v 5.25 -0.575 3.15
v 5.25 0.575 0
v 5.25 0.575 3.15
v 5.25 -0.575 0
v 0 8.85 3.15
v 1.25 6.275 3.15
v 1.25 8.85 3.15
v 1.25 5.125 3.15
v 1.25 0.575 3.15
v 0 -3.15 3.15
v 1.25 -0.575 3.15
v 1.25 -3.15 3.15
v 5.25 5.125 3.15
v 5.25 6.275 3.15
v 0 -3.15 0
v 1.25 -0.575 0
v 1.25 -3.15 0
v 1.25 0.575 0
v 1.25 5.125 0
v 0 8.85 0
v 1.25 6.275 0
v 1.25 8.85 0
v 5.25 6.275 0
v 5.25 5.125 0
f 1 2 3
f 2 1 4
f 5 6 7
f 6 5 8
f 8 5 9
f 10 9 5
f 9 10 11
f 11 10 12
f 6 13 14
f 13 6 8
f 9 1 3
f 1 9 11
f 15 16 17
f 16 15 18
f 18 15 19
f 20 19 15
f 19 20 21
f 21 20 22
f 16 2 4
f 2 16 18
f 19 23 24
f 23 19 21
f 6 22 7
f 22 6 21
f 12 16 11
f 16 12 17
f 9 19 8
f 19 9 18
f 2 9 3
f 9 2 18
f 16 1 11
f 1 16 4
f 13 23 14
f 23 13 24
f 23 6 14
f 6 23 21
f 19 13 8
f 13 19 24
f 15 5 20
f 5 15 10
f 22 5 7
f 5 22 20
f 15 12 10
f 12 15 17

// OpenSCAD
//Constants
KEY_1U_MODIFIER = 1;
KEY_1_25U_MODIFIER = 1.25;
KEY_1_5U_MODIFIER = 1.5;

ROUNDING_FACE_NUMBER = 50;

//Variables
_switchLength = 15;
_switchWidth = 15;

_switchPaddingLength = 2.25;
_switchPaddingWidth = 2.25;

_kailhKeyCapDepth = 2.5;

_key1uLength = (_switchLength*KEY_1U_MODIFIER)+(_switchPaddingLength*2);
_key1uWidth = (_switchWidth*KEY_1U_MODIFIER)+(_switchPaddingWidth*2);
_key1_25uLength = (_switchLength*KEY_1U_MODIFIER)+(_switchPaddingLength*2);
_key1_25uWidth = (_switchWidth*KEY_1_25U_MODIFIER)+(_switchPaddingWidth*2);
_key1_5uLength = (_switchLength*KEY_1U_MODIFIER)+(_switchPaddingLength*2);
_key1_5uWidth = (_switchWidth*KEY_1_5U_MODIFIER)+(_switchPaddingWidth*2);

_keyCapSpacingOffset = 1.2;
_keyCapWallThickness = 2;
_keyCapRoundingRadius = 3;

_keyCap1uLength = _key1uLength - _keyCapSpacingOffset;
_keyCap1uWidth = _key1uWidth - _keyCapSpacingOffset;
_keyCap1_25uLength = _key1_25uLength - _keyCapSpacingOffset;
_keyCap1_25uWidth = _key1_25uWidth - _keyCapSpacingOffset;
_keyCap1_5uLength = _key1_5uLength - _keyCapSpacingOffset;
_keyCap1_5uWidth = _key1_5uWidth - _keyCapSpacingOffset;

// Note: This is setting that might have to be tweaked depending
// on the printer's resolution. Lower the number for tighter gaps.
_capInterfaceGapTolerance = 0.07;
_switchInterfaceGapTolerance = 0.05;

_switchInterfaceShankLength = 4.00;
_switchInterfaceShankWidth = 1.20 - _switchInterfaceGapTolerance;
_switchInterfaceShankDepth = 3.2 - _switchInterfaceGapTolerance;
_switchInterfaceShankCenterToCenter = 5.70;
_capInterfaceConnectorLength = 1.25;
_capInterfaceConnectorWidth = 12;
_capInterfaceConnectorDepth = _switchInterfaceShankDepth;
_capInterfaceConnectorCutoutDepth = _capInterfaceConnectorDepth;

/// MAIN START ///

//kailhKeyCapTop(_keyCap1uLength, _keyCap1uWidth, _kailhKeyCapDepth);
//kailhKeyCapTop(_keyCap1_25uWidth, _keyCap1uWidth, _kailhKeyCapDepth);
//kailhKeyCapTop(_keyCap1_5uWidth, _keyCap1uWidth, _kailhKeyCapDepth);
kailhKeycapShank();

/// MAIN END ///


//Bodies
module kailhKeyCapTop(length, width, depth)
{
    difference()
    {
        union()
        {
            difference()
            {
                baseCapDepth = 20;
                // Form the base cap
                difference()
                {
                    roundedCube(size=[length, width, baseCapDepth], radius = _keyCapRoundingRadius, apply_to="zall");
                    cutoutCubeSize = [length-(_keyCapWallThickness*2), width-(_keyCapWallThickness*2), baseCapDepth];
                    translate([_keyCapWallThickness, _keyCapWallThickness, _keyCapWallThickness])
                        roundedCube(size=cutoutCubeSize, radius = _keyCapRoundingRadius, apply_to="zmin");
                }
                // Cut to the desired depth
                translate([-1,-1,depth])
                    cube([length+2,width+2, baseCapDepth]);
            }

            // Bar to thicken shank interface area
            thickeningBarLengthPadding = 3;
            thickeningBarWidthPadding = 6;
            thickeningBarLength = length-thickeningBarLengthPadding*2;
            thickeningBarWidth = width-thickeningBarWidthPadding*2;
            roundedCubeDepthAdjustment = 0.1;
            translate([(length-thickeningBarLength)/2, (width-thickeningBarWidth)/2, roundedCubeDepthAdjustment])
                cube([thickeningBarLength, thickeningBarWidth, depth-roundedCubeDepthAdjustment]);
        }

        // Cut out the interface for the shank
        translate([((length-_capInterfaceConnectorWidth-_capInterfaceGapTolerance)/2)-_switchInterfaceGapTolerance,((width-_capInterfaceConnectorDepth-_capInterfaceGapTolerance)/2)-_switchInterfaceGapTolerance, depth-_capInterfaceConnectorLength])
            union()
            {
                cube([_capInterfaceConnectorWidth+(_capInterfaceGapTolerance*2), _capInterfaceConnectorDepth+(_capInterfaceGapTolerance*2), _capInterfaceConnectorLength+1]);
            }
    }
}

module kailhKeycapShank()
{

    union()
    {
        //Interface connector
        capInterfaceCenteringWidth = (_switchInterfaceShankCenterToCenter-_capInterfaceConnectorWidth)/2;
        translate([0,capInterfaceCenteringWidth,0])
            cube([_capInterfaceConnectorLength, _capInterfaceConnectorWidth, _capInterfaceConnectorDepth]);

        //Switch interface
        centeringWidth = ((_capInterfaceConnectorWidth-(_switchInterfaceShankCenterToCenter+_switchInterfaceShankWidth))/2)+capInterfaceCenteringWidth;
        translate([0,centeringWidth,0])
        {
            translate([_capInterfaceConnectorLength,0,0])
                cube([_switchInterfaceShankLength, _switchInterfaceShankWidth, _switchInterfaceShankDepth]);
            translate([_capInterfaceConnectorLength, _switchInterfaceShankCenterToCenter,0])
                cube([_switchInterfaceShankLength, _switchInterfaceShankWidth, _switchInterfaceShankDepth]);
        }
    }
}

//Utility
/// Builds a cube with rounded corners
/// size - dimension vector
/// center - centered on xyz planes?
/// radius - rounding radius
/// apply_to - which sides to round
module roundedCube(size = [1, 1, 1], center = false, radius = 0.5, apply_to = "all")
{
    // If single value, convert to [x, y, z] vector
    size = (size[0] == undef) ? [size, size, size] : size;

    translate_min = radius;
    translate_xmax = size[0] - radius;
    translate_ymax = size[1] - radius;
    translate_zmax = size[2] - radius;

    diameter = radius * 2;

    obj_translate = (center == false) ?
        [0, 0, 0] : [
            -(size[0] / 2),
            -(size[1] / 2),
            -(size[2] / 2)
        ];

    translate(v = obj_translate) {
        hull() {
            for (translate_x = [translate_min, translate_xmax]) {
                x_at = (translate_x == translate_min) ? "min" : "max";
                for (translate_y = [translate_min, translate_ymax]) {
                    y_at = (translate_y == translate_min) ? "min" : "max";
                    for (translate_z = [translate_min, translate_zmax]) {
                        z_at = (translate_z == translate_min) ? "min" : "max";

                        translate(v = [translate_x, translate_y, translate_z])
                        if (
                            (apply_to == "all") ||
                            (apply_to == "xmin" && x_at == "min") || (apply_to == "xmax" && x_at == "max") ||
                            (apply_to == "ymin" && y_at == "min") || (apply_to == "ymax" && y_at == "max") ||
                            (apply_to == "zmin" && z_at == "min") || (apply_to == "zmax" && z_at == "max")
                        ) {
                            sphere(r = radius, $fn=ROUNDING_FACE_NUMBER);
                        } else {
                            rotate =
                                (apply_to == "xmin" || apply_to == "xmax" || apply_to == "x") ? [0, 90, 0] : (
                                (apply_to == "ymin" || apply_to == "ymax" || apply_to == "y") ? [90, 90, 0] :
                                [0, 0, 0]
                            );
                            rotate(a = rotate)
                            cylinder(h = diameter, r = radius, center = true, $fn=ROUNDING_FACE_NUMBER);
                        }
                    }
                }
            }
        }
    }
}
